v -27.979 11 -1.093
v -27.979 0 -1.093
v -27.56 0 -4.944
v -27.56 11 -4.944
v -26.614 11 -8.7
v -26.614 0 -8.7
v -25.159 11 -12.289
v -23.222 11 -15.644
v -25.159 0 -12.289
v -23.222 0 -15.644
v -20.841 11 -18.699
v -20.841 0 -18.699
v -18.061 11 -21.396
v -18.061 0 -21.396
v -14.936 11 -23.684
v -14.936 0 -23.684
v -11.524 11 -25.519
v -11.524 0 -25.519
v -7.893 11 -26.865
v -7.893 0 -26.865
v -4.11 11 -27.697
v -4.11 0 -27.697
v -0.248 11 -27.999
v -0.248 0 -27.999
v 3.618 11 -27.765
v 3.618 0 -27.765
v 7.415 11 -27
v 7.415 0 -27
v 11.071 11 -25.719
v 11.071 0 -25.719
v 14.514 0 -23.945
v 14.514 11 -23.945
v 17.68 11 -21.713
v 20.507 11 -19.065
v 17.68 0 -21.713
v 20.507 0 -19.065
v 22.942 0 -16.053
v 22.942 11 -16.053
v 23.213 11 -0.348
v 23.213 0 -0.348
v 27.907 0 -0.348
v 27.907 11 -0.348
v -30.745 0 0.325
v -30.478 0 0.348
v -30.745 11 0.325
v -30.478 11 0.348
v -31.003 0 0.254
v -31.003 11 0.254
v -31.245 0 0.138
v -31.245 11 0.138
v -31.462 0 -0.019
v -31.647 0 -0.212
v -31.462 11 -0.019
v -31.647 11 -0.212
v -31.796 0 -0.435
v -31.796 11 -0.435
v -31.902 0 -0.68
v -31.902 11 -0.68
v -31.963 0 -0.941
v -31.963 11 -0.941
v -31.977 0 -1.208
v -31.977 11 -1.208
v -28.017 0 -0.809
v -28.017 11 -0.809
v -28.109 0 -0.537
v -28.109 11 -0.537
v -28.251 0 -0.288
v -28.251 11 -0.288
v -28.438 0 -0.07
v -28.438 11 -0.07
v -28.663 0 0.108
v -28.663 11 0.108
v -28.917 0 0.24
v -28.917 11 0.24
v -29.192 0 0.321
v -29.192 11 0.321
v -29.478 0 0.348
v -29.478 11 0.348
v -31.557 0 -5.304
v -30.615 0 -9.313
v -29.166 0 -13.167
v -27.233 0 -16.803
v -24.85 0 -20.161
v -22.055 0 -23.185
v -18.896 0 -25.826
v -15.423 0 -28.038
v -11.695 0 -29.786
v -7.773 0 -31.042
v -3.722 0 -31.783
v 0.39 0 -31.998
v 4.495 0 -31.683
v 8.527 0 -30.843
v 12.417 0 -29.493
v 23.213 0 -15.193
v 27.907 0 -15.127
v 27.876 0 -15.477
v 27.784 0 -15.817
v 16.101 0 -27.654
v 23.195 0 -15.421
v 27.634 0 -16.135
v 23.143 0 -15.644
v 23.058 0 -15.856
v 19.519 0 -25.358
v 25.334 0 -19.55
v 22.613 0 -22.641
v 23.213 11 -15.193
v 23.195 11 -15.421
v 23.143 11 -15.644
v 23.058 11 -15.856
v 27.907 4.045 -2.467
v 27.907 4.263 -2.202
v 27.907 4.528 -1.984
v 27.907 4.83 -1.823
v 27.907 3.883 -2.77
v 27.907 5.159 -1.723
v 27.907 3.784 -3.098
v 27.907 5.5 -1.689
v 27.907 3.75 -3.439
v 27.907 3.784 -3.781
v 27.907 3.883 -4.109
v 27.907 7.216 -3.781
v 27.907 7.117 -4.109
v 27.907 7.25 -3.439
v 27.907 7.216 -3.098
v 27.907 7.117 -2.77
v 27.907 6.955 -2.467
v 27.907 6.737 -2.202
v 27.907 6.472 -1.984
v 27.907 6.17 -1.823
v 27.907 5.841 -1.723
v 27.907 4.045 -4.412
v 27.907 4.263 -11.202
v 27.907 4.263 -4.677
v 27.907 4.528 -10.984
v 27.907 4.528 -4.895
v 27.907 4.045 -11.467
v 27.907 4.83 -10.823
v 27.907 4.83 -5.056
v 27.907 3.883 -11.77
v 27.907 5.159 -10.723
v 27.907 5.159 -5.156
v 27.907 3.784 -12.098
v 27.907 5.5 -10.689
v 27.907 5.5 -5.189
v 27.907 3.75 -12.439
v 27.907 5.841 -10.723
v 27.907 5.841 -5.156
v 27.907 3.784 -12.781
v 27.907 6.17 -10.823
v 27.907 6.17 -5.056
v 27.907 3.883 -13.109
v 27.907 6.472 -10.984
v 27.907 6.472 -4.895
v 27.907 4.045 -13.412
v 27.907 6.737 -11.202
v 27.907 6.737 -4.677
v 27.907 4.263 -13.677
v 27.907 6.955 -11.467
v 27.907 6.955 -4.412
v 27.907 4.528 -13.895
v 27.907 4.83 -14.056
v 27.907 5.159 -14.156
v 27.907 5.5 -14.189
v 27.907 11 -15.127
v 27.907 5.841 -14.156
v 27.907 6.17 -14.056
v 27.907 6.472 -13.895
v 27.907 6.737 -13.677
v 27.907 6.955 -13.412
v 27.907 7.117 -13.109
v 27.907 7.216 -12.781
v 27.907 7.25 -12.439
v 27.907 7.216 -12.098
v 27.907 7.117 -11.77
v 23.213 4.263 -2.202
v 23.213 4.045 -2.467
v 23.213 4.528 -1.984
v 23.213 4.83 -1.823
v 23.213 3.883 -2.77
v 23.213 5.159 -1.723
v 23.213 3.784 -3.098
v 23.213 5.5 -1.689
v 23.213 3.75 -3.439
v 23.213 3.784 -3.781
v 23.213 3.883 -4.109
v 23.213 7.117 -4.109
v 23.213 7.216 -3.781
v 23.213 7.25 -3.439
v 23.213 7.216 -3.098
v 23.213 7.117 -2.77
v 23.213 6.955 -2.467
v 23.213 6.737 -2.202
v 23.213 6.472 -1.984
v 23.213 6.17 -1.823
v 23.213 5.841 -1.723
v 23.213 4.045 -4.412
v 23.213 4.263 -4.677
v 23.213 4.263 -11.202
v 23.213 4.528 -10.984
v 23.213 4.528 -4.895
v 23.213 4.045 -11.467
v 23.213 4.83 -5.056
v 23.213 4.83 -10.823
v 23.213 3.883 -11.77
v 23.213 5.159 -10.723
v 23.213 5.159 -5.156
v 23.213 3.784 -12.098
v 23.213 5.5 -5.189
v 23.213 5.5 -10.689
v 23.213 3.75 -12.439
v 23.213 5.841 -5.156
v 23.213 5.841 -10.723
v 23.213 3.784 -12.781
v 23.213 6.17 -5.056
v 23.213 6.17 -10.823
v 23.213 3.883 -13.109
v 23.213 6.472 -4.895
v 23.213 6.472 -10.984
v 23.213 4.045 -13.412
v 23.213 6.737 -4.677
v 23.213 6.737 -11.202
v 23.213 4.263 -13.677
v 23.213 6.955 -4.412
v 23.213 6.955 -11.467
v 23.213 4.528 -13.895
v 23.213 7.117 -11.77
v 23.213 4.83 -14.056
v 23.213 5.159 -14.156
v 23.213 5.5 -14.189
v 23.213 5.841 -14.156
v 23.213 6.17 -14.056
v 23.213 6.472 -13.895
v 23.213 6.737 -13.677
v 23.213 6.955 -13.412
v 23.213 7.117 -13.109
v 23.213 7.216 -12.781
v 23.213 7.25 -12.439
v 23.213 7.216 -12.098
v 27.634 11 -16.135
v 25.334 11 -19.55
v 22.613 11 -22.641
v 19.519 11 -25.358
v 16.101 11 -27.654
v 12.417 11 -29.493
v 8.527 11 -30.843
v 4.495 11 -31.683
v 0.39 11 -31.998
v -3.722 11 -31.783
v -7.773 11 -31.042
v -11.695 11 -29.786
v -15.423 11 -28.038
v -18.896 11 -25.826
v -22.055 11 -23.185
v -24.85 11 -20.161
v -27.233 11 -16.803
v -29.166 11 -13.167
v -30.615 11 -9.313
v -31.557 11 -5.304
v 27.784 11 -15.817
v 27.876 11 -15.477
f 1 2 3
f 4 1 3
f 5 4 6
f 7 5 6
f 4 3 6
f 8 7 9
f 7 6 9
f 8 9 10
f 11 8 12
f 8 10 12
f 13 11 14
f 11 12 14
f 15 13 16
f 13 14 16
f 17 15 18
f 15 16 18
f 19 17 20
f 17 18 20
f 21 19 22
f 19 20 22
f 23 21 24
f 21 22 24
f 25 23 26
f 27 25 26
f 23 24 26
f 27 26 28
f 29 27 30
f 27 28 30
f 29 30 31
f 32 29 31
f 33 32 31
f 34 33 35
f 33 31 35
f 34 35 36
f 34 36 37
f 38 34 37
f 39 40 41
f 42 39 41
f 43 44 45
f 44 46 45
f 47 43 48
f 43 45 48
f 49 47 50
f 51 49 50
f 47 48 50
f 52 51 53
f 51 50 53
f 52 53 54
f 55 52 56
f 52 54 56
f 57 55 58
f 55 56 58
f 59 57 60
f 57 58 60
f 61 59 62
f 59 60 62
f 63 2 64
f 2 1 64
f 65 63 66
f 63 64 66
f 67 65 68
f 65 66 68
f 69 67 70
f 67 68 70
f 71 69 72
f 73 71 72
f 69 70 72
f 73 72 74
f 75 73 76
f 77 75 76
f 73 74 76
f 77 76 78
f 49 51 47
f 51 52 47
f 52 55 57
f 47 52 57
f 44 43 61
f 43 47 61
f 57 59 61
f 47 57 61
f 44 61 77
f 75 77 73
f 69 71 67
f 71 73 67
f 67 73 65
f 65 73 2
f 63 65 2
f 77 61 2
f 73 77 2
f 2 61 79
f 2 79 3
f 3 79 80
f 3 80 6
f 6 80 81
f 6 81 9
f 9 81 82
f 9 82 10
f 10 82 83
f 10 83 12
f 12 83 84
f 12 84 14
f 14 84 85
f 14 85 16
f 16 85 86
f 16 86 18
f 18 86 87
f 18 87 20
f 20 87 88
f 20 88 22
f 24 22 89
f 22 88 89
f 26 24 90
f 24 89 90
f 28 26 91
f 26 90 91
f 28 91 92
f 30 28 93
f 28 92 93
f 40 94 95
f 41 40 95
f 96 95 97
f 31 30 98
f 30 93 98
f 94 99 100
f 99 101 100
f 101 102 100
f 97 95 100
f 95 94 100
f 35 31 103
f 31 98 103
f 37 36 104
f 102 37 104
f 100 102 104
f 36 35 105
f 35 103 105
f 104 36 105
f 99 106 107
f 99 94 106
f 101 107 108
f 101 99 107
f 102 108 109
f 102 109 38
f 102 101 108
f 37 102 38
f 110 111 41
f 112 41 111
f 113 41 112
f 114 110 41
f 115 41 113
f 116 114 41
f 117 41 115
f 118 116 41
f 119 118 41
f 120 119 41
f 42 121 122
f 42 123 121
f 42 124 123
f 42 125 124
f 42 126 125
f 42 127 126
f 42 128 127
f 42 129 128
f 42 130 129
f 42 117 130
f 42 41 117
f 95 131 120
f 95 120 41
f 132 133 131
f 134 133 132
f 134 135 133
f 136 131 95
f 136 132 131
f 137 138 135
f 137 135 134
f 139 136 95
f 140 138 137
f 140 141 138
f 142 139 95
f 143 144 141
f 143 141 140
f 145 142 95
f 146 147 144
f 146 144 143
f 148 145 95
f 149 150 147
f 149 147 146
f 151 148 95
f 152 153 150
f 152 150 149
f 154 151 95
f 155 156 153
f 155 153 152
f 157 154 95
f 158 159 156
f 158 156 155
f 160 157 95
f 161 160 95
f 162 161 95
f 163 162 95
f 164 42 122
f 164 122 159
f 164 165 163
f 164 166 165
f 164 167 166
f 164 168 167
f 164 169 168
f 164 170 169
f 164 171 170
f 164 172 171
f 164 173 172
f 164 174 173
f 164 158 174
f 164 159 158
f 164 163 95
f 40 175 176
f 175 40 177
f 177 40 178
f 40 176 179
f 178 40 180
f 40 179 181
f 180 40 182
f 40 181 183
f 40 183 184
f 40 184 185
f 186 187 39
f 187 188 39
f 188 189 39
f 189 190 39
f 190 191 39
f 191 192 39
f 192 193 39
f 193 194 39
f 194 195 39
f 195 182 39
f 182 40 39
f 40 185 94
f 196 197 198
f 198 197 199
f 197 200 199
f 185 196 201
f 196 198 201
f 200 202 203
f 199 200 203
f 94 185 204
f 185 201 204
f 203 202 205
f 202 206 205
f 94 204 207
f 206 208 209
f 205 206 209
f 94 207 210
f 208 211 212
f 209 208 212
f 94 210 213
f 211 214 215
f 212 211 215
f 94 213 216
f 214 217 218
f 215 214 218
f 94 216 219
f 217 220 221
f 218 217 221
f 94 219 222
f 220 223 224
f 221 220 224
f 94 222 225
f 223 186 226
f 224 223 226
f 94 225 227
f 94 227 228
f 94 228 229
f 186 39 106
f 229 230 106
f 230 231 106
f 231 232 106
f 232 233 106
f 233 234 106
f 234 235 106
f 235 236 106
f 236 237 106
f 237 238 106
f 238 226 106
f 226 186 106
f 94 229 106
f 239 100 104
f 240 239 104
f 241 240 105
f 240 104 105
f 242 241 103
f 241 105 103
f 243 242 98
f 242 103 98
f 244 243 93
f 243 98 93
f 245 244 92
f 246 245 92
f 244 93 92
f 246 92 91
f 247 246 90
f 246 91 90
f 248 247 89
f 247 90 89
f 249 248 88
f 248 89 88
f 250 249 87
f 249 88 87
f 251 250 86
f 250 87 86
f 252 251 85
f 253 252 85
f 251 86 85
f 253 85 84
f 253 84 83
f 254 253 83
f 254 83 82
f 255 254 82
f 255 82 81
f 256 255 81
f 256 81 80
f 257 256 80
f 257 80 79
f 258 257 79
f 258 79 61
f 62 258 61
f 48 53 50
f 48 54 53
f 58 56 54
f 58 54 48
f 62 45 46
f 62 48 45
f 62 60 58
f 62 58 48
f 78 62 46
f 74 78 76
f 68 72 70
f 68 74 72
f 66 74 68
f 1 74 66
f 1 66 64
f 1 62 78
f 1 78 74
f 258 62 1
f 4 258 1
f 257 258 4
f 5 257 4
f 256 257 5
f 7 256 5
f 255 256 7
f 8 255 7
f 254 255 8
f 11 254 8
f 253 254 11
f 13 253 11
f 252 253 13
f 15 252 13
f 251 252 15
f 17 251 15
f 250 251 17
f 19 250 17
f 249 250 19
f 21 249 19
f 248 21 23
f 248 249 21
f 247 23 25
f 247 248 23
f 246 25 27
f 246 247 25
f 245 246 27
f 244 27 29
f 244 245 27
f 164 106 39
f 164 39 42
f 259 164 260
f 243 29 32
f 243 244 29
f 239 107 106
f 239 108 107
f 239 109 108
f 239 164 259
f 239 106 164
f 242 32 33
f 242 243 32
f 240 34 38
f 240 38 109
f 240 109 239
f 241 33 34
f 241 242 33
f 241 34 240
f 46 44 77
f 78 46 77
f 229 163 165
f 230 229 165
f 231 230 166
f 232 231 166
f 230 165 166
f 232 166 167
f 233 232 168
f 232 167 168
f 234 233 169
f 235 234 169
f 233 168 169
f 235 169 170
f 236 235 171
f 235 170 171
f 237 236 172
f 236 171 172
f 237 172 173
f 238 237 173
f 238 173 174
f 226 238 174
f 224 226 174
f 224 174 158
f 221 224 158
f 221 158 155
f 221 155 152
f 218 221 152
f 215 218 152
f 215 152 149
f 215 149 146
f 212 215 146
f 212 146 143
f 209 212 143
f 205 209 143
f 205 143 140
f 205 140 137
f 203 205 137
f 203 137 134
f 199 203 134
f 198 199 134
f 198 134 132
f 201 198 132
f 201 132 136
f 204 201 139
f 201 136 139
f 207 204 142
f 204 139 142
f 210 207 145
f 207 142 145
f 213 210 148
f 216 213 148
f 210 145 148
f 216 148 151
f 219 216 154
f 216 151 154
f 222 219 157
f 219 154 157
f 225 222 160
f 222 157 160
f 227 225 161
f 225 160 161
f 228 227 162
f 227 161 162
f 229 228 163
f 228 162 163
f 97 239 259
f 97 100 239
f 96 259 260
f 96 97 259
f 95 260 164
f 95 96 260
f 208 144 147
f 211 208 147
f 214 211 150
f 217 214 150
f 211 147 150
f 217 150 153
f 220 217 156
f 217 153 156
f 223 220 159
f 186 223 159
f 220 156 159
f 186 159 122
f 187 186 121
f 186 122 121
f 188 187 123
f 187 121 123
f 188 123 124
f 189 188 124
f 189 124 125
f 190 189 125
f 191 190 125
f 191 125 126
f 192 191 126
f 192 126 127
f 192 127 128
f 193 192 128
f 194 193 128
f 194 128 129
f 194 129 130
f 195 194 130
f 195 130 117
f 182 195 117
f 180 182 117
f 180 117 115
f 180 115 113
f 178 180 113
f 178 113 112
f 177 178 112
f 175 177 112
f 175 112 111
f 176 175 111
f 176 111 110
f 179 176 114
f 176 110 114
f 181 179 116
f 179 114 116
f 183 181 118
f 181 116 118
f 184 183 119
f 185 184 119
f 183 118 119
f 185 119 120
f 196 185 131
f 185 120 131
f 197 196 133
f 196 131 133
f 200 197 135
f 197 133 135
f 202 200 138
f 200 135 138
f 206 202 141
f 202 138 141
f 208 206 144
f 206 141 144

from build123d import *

# Parameters (mm, degrees)
BOSS_EXTRUDE1_DEPTH = 11
SKETCH2_W           = 8.785422424
SKETCH2_H           = 15.31
BOSS_EXTRUDE2_DEPTH = 11
CUT_EXTRUDE3_REACH  = 74.393
SKETCH3_R           = 1.75
FILLET2_R           = 1.5
FILLET4_R           = 1.5
CUT_EXTRUDE4_REACH  = 48.571
SKETCH5_W           = 4.090875198
SKETCH5_H           = 15.31
FILLET6_R           = 2


with BuildPart() as part:
    # Sketch1 → Boss-Extrude1 (new body)
    with BuildSketch(Plane(origin=(0, 0, 0), x_dir=(1, 0, 0), z_dir=(0, 1, 0))):
        with BuildLine():
            Line((-31.998102942, -0.348436693), (-27.998102942, -0.348436693))
            ThreePointArc((-27.998102942, -0.348436693), (-0.348436693, 27.998102942), (27.998102942, 0.348436693))
            Line((27.998102942, 0.348436693), (31.998102942, 0.348436693))
            ThreePointArc((31.998102942, 0.348436693), (-0.348436693, 31.998102942), (-31.998102942, -0.348436693))
        make_face()
    extrude(amount=BOSS_EXTRUDE1_DEPTH)

    # Sketch2 → Boss-Extrude2 (add, through all)
    with BuildSketch(Plane(origin=(0, 11, 0), x_dir=(1, 0, 0), z_dir=(0, 1, 0))):
        with Locations((27.60539173, 8.003436693)):
            Rectangle(SKETCH2_W, SKETCH2_H)
    extrude(amount=-BOSS_EXTRUDE2_DEPTH)

    # Sketch3 → Cut-Extrude3 (cut, up to next)
    with BuildSketch(Plane(origin=(31.998102942, 0, 0), x_dir=(0, 0, -1), z_dir=(1, 0, 0)), mode=Mode.PRIVATE) as cut_extrude3_sk1:
        with Locations((3.439433815, 5.5)):
            Circle(SKETCH3_R)
    cut_extrude3_tool1 = extrude(cut_extrude3_sk1.sketch, amount=-CUT_EXTRUDE3_REACH, mode=Mode.PRIVATE) & part.part
    # Sketch3 → Cut-Extrude3 (cut, up to next)
    with BuildSketch(Plane(origin=(31.998102942, 0, 0), x_dir=(0, 0, -1), z_dir=(1, 0, 0)), mode=Mode.PRIVATE) as cut_extrude3_sk2:
        with Locations((12.439433815, 5.5)):
            Circle(SKETCH3_R)
    cut_extrude3_tool2 = extrude(cut_extrude3_sk2.sketch, amount=-CUT_EXTRUDE3_REACH, mode=Mode.PRIVATE) & part.part
    add(cut_extrude3_tool1.solids().sort_by_distance((31.998103, 5.5, -3.439434))[0], mode=Mode.SUBTRACT)
    add(cut_extrude3_tool2.solids().sort_by_distance((31.998103, 5.5, -12.439434))[0], mode=Mode.SUBTRACT)

    # Fillet2
    fillet2_edges = [part.edges().sort_by_distance(p)[0] for p in [
        (23.212680518, 5.5, -15.658436693),
    ]]
    fillet(fillet2_edges, radius=FILLET2_R)

    # Fillet4
    fillet4_edges = [part.edges().sort_by_distance(p)[0] for p in [
        (-31.998102942, 5.5, 0.348436693),
        (-27.998102942, 5.5, 0.348436693),
    ]]
    fillet(fillet4_edges, radius=FILLET4_R)

    # Sketch5 → Cut-Extrude4 (cut, up to next)
    with BuildSketch(Plane(origin=(0, 11, 0), x_dir=(1, 0, 0), z_dir=(0, 1, 0)), mode=Mode.PRIVATE) as cut_extrude4_sk1:
        with Locations((29.952665343, 8.003436693)):
            Rectangle(SKETCH5_W, SKETCH5_H)
    cut_extrude4_tool1 = extrude(cut_extrude4_sk1.sketch, amount=-CUT_EXTRUDE4_REACH, mode=Mode.PRIVATE) & part.part
    add(cut_extrude4_tool1.solids().sort_by_distance((29.952665, 11, -8.003437))[0], mode=Mode.SUBTRACT)

    # Fillet6
    fillet6_edges = [part.edges().sort_by_distance(p)[0] for p in [
        (27.907227744, 5.5, -15.658436693),
    ]]
    fillet(fillet6_edges, radius=FILLET6_R)


solid = part.part
